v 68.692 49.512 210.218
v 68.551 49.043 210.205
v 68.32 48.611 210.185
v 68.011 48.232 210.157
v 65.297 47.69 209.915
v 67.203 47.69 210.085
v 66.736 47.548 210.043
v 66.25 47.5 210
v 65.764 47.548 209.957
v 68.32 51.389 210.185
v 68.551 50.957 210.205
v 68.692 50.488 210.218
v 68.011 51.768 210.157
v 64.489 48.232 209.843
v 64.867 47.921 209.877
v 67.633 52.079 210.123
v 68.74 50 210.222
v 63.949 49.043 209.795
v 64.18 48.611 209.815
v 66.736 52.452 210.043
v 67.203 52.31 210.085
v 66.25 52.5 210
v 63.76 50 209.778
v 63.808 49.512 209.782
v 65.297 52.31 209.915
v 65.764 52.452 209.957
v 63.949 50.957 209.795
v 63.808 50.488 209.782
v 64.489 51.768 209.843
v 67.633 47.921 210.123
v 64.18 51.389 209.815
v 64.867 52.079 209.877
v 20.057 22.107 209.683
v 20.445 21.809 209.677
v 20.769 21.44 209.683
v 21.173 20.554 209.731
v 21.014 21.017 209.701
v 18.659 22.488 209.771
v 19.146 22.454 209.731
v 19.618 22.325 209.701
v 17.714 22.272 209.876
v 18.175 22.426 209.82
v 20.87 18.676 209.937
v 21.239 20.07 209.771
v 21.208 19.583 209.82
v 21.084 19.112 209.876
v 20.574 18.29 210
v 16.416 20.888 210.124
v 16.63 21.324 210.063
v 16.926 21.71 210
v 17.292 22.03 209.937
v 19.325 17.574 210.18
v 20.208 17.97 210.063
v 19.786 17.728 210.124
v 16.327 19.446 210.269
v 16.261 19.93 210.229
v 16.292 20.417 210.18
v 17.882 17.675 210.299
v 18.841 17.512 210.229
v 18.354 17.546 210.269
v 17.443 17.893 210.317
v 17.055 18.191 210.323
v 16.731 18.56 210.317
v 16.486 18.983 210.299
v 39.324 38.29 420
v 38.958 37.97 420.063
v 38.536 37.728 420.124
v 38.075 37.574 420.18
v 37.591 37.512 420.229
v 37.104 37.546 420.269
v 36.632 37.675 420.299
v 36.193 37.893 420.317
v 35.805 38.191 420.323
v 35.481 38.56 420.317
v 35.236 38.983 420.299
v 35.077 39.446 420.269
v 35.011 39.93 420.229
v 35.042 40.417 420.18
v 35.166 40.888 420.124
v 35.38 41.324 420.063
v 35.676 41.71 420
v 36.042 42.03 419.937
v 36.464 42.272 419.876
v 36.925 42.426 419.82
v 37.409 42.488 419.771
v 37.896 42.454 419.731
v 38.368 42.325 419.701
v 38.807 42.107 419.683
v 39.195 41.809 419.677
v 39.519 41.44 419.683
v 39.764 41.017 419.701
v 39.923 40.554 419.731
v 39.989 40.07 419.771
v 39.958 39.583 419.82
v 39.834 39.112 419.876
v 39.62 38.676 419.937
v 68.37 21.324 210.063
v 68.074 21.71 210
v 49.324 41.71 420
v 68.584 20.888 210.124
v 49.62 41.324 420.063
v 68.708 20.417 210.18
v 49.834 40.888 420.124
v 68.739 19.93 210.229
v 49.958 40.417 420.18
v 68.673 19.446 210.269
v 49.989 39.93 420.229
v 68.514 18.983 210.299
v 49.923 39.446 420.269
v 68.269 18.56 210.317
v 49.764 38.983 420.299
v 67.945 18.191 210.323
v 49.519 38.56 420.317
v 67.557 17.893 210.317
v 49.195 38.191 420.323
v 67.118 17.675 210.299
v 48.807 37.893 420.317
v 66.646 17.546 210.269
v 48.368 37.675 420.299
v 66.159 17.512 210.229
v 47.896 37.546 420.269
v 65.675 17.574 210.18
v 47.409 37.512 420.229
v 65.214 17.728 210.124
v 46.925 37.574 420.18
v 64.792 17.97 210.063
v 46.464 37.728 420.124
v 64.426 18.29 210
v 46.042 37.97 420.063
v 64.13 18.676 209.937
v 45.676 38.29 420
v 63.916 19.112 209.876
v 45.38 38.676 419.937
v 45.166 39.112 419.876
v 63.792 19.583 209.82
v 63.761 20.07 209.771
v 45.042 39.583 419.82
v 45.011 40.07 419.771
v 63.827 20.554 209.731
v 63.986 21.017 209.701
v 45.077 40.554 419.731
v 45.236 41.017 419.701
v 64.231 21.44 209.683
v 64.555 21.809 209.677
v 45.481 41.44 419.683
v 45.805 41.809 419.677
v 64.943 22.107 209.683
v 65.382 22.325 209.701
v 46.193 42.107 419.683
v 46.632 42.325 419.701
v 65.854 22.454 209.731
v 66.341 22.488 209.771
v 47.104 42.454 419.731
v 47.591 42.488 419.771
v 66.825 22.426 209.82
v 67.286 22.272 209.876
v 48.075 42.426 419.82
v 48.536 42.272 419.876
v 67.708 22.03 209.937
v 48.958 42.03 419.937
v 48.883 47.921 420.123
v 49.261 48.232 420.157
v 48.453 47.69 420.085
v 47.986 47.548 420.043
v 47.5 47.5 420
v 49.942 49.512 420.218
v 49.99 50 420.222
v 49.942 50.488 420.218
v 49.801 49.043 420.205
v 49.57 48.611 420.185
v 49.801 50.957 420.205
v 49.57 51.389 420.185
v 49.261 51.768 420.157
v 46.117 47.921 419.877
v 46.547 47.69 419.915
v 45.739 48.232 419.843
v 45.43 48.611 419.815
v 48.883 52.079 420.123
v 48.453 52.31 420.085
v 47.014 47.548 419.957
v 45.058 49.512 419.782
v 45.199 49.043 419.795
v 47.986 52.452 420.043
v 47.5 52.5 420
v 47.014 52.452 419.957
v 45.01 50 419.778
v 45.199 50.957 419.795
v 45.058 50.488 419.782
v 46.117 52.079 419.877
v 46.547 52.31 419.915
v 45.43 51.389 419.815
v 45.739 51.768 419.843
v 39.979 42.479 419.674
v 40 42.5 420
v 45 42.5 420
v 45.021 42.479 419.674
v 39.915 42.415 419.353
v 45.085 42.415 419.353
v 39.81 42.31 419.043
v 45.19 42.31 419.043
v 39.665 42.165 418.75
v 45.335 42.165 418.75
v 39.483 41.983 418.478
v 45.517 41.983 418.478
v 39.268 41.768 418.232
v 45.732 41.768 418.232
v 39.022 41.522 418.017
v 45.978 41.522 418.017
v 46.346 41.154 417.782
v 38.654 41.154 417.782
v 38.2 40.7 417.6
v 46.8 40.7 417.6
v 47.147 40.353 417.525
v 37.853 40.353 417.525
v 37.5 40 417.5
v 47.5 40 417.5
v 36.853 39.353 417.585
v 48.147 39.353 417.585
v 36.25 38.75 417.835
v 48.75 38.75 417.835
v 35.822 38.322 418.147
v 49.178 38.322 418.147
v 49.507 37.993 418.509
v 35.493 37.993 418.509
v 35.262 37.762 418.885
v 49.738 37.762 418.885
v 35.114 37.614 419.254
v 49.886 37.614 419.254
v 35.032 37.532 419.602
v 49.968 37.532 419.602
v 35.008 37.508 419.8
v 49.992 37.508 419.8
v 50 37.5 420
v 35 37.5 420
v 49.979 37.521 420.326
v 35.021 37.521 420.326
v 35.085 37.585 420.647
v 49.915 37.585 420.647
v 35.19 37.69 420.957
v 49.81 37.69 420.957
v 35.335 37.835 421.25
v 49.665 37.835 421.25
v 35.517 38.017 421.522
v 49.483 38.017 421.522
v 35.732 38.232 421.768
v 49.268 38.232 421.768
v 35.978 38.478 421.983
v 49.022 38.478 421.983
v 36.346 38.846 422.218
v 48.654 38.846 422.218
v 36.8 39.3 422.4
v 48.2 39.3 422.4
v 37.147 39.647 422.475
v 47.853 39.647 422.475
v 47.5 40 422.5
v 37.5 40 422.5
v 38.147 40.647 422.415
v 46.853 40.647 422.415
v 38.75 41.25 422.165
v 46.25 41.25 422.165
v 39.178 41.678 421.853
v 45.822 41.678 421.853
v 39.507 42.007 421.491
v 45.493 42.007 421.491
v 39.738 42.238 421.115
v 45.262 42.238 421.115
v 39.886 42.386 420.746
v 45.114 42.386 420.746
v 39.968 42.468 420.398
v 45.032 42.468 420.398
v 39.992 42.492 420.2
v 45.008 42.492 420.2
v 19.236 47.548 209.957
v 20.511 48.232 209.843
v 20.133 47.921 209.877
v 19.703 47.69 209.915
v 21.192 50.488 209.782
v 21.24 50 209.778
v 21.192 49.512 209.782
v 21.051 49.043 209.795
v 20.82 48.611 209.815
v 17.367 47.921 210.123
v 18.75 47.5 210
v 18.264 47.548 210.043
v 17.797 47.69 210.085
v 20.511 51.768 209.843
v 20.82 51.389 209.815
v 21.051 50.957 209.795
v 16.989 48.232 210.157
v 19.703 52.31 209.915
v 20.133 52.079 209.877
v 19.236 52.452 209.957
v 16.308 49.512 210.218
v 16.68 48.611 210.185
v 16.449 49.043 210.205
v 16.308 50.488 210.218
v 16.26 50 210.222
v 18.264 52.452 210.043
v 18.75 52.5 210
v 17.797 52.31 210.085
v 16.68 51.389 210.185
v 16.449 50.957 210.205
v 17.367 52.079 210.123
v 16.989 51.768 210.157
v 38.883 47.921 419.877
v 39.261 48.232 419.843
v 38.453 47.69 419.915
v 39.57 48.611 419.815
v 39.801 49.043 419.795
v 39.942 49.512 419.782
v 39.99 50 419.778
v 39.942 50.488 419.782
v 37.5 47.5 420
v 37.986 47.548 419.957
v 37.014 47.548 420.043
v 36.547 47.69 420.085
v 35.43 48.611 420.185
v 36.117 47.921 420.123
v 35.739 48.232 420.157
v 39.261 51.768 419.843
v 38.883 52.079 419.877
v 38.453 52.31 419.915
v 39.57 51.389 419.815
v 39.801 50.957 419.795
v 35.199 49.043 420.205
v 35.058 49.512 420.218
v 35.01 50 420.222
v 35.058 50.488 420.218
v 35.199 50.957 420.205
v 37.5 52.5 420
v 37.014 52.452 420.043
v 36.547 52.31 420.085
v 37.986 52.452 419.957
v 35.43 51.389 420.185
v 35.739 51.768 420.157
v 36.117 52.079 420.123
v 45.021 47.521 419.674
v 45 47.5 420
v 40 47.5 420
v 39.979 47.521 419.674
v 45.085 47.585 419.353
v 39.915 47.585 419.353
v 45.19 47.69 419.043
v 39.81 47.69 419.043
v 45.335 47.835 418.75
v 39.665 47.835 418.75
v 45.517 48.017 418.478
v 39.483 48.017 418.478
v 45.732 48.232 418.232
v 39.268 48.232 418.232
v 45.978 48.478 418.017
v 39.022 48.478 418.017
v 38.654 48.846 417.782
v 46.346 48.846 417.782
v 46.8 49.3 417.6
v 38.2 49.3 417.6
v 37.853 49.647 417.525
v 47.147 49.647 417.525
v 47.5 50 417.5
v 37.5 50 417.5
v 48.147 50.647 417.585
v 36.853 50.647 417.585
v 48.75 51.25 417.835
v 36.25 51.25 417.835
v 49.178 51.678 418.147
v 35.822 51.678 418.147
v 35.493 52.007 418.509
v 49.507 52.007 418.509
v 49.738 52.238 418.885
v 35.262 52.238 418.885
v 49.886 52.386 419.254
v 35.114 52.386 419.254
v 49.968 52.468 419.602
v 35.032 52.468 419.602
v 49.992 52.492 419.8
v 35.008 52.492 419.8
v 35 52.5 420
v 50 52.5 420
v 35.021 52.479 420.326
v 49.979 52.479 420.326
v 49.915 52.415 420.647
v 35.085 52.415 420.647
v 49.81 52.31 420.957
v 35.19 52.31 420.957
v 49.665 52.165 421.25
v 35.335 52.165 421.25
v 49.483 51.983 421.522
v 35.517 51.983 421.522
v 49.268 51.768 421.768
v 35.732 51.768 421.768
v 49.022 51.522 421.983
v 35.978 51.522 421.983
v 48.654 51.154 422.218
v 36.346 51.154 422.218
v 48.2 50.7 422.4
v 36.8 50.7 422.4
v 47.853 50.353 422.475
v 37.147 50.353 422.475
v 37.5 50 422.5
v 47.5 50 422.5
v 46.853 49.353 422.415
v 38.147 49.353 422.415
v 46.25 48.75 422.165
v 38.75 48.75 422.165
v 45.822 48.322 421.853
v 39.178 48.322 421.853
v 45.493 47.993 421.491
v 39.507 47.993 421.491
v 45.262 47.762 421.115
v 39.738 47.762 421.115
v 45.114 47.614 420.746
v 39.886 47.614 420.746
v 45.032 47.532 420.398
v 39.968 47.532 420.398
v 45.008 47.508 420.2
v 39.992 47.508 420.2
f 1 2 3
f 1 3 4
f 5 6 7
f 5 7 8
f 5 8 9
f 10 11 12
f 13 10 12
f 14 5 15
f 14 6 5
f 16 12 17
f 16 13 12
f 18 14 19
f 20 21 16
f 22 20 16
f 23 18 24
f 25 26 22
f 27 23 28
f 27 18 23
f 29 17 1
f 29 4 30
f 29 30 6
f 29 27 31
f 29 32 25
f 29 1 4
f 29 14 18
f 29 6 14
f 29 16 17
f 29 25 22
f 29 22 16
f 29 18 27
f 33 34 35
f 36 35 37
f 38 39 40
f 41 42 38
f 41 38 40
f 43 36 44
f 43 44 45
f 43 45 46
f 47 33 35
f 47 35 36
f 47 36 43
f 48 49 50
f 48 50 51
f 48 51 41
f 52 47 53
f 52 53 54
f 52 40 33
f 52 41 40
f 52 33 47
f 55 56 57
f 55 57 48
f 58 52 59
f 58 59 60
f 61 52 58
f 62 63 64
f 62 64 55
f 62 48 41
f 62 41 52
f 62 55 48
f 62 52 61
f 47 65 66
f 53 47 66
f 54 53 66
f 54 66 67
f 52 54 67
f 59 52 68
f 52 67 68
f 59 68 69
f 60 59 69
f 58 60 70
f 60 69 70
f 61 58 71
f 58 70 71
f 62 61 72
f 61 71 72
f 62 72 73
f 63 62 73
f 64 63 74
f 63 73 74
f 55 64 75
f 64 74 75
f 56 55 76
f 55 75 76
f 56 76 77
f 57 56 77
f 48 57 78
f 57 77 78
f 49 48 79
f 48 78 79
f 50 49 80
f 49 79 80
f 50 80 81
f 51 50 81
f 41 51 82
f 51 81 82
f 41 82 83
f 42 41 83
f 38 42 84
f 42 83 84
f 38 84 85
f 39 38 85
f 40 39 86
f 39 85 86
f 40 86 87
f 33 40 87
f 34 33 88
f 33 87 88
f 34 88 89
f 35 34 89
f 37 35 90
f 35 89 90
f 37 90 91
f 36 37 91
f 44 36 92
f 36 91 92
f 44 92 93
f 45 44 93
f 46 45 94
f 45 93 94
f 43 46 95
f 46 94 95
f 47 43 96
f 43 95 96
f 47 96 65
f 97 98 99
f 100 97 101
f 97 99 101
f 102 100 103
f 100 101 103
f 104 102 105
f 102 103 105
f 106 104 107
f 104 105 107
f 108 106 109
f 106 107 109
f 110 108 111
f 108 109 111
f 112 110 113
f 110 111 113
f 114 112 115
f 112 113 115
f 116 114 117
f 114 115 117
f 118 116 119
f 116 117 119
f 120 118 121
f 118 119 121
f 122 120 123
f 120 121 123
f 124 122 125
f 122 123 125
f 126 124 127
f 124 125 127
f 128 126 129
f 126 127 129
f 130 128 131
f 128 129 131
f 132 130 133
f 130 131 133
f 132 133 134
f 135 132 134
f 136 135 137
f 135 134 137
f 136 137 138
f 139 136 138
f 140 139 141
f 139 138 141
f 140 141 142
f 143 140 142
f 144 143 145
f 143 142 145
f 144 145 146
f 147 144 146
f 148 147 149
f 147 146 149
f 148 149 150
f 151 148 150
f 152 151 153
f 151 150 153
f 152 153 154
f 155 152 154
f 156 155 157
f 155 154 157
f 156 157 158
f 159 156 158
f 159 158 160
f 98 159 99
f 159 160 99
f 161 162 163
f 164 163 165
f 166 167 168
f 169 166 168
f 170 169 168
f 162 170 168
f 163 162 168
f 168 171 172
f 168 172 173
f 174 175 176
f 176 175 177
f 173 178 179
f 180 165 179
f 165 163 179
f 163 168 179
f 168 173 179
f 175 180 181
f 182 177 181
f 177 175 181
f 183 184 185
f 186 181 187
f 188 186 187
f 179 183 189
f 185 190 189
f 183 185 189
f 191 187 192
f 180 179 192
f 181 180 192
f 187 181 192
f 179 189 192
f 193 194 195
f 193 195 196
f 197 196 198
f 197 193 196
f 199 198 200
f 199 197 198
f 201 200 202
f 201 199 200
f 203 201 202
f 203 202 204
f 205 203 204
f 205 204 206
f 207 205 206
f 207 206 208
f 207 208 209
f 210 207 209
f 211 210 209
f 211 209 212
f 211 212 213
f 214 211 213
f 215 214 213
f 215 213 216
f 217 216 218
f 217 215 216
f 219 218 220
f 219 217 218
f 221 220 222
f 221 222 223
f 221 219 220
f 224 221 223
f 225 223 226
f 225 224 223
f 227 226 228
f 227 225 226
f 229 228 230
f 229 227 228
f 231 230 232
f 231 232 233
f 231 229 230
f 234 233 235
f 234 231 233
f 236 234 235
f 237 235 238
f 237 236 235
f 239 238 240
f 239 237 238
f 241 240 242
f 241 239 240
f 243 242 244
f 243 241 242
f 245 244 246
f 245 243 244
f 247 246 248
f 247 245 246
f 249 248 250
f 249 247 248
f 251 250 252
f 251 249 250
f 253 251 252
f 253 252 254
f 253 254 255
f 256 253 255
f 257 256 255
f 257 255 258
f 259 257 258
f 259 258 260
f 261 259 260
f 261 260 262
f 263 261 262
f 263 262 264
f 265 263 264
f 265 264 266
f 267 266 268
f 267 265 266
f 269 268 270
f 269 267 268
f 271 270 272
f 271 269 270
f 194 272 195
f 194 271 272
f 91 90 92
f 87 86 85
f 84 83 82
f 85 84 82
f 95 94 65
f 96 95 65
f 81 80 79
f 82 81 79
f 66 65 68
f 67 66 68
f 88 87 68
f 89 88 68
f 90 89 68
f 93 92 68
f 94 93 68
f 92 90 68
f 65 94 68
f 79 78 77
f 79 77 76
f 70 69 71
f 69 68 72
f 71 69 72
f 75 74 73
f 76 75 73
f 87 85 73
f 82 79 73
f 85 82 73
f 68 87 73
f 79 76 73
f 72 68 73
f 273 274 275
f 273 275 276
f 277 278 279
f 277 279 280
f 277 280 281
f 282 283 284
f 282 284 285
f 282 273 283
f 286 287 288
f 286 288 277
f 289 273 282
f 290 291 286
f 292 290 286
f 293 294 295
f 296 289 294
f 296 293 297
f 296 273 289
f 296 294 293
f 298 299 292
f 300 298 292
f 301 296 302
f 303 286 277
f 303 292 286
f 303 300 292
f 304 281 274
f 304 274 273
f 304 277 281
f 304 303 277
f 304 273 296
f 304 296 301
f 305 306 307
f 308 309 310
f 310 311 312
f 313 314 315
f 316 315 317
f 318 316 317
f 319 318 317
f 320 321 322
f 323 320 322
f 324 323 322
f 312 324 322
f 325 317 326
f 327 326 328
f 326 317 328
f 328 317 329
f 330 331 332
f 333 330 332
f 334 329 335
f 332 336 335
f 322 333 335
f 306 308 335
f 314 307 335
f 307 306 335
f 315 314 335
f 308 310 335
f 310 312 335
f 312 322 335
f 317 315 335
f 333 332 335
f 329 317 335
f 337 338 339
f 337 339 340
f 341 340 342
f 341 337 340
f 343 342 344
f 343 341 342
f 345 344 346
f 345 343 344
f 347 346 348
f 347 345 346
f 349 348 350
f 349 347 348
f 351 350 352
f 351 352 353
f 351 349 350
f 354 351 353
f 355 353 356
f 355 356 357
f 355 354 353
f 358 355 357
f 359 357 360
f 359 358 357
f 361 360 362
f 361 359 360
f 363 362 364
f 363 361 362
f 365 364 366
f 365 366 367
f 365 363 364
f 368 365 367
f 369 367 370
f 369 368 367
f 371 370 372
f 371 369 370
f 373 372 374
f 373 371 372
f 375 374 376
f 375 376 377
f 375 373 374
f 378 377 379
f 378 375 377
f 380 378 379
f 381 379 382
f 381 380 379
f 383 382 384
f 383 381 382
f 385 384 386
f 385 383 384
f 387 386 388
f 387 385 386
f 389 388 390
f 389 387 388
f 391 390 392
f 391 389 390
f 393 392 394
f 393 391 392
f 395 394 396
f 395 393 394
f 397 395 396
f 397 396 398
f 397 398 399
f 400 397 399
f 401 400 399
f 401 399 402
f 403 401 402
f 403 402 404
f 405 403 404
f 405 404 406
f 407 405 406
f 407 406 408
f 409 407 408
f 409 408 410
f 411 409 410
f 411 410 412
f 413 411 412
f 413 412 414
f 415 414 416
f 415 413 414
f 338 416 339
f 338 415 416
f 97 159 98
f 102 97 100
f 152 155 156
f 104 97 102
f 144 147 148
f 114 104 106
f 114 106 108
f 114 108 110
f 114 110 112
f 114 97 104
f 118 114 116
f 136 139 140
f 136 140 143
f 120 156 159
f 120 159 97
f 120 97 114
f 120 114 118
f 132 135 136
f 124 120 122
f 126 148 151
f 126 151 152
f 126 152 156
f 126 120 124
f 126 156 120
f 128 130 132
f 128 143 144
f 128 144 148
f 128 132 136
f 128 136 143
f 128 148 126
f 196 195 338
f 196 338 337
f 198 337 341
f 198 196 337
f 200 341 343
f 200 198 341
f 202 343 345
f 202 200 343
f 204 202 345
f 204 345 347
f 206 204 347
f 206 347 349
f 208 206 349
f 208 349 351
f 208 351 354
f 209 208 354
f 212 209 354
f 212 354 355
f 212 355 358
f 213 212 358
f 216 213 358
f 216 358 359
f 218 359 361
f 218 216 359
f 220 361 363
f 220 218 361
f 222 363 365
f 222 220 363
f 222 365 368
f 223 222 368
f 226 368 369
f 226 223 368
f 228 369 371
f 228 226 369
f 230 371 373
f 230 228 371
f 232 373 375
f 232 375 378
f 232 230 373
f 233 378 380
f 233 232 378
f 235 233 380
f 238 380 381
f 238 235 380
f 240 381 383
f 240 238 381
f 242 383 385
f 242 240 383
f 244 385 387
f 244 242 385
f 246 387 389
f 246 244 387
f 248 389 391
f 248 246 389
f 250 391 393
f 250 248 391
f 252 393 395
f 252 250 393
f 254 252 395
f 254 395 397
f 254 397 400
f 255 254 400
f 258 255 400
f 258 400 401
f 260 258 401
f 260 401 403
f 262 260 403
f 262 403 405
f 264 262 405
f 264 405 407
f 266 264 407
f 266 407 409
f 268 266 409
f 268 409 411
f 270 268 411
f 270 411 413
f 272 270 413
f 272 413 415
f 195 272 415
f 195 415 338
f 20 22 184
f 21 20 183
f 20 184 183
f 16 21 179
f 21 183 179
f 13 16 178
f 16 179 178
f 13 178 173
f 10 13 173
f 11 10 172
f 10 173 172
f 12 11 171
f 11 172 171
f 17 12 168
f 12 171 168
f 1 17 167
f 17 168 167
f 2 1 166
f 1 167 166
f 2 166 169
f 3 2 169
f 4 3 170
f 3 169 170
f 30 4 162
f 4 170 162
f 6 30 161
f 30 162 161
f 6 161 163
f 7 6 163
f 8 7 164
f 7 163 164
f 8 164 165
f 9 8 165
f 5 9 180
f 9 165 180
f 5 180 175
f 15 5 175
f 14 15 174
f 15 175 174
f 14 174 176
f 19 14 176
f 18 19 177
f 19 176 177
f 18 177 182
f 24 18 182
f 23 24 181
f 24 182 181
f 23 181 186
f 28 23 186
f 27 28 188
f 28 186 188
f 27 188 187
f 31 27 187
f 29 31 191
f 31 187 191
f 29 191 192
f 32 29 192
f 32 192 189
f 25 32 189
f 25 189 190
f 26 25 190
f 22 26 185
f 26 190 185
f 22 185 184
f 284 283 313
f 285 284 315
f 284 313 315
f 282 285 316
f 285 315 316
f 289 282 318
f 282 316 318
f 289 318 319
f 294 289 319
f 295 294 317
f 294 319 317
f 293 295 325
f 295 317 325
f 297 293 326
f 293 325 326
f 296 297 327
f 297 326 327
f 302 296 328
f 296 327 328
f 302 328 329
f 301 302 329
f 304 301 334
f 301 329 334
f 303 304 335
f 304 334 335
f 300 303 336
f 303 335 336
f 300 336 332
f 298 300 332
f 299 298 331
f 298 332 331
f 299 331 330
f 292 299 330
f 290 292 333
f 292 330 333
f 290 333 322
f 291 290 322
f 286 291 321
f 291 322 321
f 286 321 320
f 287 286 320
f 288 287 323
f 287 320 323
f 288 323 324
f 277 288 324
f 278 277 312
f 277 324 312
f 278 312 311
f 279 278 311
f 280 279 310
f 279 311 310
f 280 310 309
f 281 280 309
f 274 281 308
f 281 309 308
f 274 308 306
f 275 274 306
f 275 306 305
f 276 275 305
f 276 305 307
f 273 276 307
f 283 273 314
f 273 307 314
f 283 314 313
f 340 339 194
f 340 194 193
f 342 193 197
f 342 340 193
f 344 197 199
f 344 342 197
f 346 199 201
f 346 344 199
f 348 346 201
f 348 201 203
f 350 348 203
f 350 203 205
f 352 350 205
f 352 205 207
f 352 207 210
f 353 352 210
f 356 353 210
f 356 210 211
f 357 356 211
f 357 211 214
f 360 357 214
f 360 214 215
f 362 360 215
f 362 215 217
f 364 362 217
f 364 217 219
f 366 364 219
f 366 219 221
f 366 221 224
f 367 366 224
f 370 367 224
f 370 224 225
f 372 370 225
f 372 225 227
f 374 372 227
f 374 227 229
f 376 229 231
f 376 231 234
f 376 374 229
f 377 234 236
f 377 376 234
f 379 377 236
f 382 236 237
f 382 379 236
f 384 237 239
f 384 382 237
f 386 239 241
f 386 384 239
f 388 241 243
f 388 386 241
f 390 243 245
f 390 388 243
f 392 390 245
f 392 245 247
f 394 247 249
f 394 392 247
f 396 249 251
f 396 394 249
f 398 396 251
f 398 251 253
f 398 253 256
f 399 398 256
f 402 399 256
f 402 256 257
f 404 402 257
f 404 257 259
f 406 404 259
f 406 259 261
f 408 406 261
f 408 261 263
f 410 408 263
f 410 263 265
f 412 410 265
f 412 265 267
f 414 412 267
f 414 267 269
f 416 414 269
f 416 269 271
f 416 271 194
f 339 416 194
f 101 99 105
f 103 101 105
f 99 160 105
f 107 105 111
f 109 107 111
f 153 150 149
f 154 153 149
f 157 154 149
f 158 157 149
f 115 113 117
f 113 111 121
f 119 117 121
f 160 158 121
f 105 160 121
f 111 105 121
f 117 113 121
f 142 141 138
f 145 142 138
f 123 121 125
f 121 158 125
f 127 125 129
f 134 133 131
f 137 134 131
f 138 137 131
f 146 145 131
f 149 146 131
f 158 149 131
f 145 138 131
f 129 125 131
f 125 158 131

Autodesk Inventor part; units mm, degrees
ref_plane "YZ Plane" through (0, 0, 0) normal (1, 0, 0) x (0, 1, 0)
ref_plane "XZ Plane" through (0, 0, 0) normal (0, 1, 0) x (-1, 0, 0)
ref_plane "XY Plane" through (0, 0, 0) normal (0, 0, 1) x (1, 0, 0)
sketch3d "3D Sketch1"
ref_plane "Work Plane1" through (18.75, 50, 210) normal (-0.0889, 0, -0.996) x (0, -1, 0)
ref_plane "Work Plane2" through (66.25, 20, 210) normal (0.0885, -0.0944, -0.9916) x (0.7295, 0.6839, 0)
ref_plane "Work Plane3" through (66.25, 50, 210) normal (0.0889, 0, -0.996) x (0, 1, 0)
ref_plane "Work Plane4" through (18.75, 20, 210) normal (-0.0885, -0.0944, -0.9916) x (0.7295, -0.6839, 0)
ref_plane "Work Plane5" through (37.5, 40, 420) normal (0, -1, 0) x (1, 0, 0)
sketch "Sketch1" plane through (18.75, 20, 210) normal (-0.0885, -0.0944, -0.9916) x (0.7295, -0.6839, 0)
  circle A0 centre (0, 0) radius 2.5
  point P0 (0, 0)
  dimension "d15" = 5
sketch "Sketch2" plane through (18.75, 50, 210) normal (-0.0889, 0, -0.996) x (0, -1, 0)
  circle A0 centre (0, 0) radius 2.5
  point P0 (50, 0)
  dimension "d16" = 5
sketch "Sketch3" plane through (66.25, 50, 210) normal (0.0889, 0, -0.996) x (0, 1, 0)
  circle A0 centre (0, 0) radius 2.5
  point P0 (-50, -84.6632)
  dimension "d17" = 5
sketch "Sketch4" plane through (66.25, 20, 210) normal (0.0885, -0.0944, -0.9916) x (0.7295, 0.6839, 0)
  circle A0 centre (0, 0) radius 2.5
  point P0 (-62.0107, -57.6459)
  dimension "d18" = 5
sketch "Sketch5" plane through (37.5, 40, 420) normal (0, -1, 0) x (1, 0, 0)
  circle A0 centre (0, 0) radius 2.5
  point P0 (-37.5, -420)
  dimension "d19" = 5
sketch3d "3D Sketch2"
  line L0 (18.75, 20, 210) -> (37.5, 40, 420)
  dimension "d9" = 210
  dimension "d10" = 37.5
  dimension "d11" = 40
  dimension "d12" = 10
  dimension "d13" = 10
  dimension "d14" = 10
sweep "Sweep1" add profiles "Sketch1" path "3D Sketch2"
sketch3d "3D Sketch2 for Sweep2"
  line L0 (18.75, 50, 210) -> (37.5, 50, 420)
  dimension "d9" = 210
  dimension "d10" = 37.5
  dimension "d11" = 40
  dimension "d12" = 10
  dimension "d13" = 10
  dimension "d14" = 10
sweep "Sweep2" add profiles "Sketch2" path "3D Sketch2 for Sweep2" separate body
sketch3d "3D Sketch2 for Sweep3"
  line L0 (66.25, 50, 210) -> (47.5, 50, 420)
  dimension "d9" = 210
  dimension "d10" = 37.5
  dimension "d11" = 40
  dimension "d12" = 10
  dimension "d13" = 10
  dimension "d14" = 10
sweep "Sweep3" add profiles "Sketch3" path "3D Sketch2 for Sweep3" separate body
sketch3d "3D Sketch2 for Sweep4"
  line L0 (66.25, 20, 210) -> (47.5, 40, 420)
  dimension "d9" = 210
  dimension "d10" = 37.5
  dimension "d11" = 40
  dimension "d12" = 10
  dimension "d13" = 10
  dimension "d14" = 10
sweep "Sweep4" add profiles "Sketch4" path "3D Sketch2 for Sweep4" separate body
sketch3d "3D Sketch2 for Sweep5"
  line L0 (37.5, 40, 420) -> (37.5, 50, 420)
  line L1 (37.5, 50, 420) -> (47.5, 50, 420)
  line L2 (47.5, 50, 420) -> (47.5, 40, 420)
  line L3 (47.5, 40, 420) -> (37.5, 40, 420)
  dimension "d9" = 210
  dimension "d10" = 37.5
  dimension "d11" = 40
  dimension "d12" = 10
  dimension "d13" = 10
  dimension "d14" = 10
sweep "Sweep5" add profiles "Sketch5" path "3D Sketch2 for Sweep5" separate body
properties part number "RCPlaneTailRear2"
